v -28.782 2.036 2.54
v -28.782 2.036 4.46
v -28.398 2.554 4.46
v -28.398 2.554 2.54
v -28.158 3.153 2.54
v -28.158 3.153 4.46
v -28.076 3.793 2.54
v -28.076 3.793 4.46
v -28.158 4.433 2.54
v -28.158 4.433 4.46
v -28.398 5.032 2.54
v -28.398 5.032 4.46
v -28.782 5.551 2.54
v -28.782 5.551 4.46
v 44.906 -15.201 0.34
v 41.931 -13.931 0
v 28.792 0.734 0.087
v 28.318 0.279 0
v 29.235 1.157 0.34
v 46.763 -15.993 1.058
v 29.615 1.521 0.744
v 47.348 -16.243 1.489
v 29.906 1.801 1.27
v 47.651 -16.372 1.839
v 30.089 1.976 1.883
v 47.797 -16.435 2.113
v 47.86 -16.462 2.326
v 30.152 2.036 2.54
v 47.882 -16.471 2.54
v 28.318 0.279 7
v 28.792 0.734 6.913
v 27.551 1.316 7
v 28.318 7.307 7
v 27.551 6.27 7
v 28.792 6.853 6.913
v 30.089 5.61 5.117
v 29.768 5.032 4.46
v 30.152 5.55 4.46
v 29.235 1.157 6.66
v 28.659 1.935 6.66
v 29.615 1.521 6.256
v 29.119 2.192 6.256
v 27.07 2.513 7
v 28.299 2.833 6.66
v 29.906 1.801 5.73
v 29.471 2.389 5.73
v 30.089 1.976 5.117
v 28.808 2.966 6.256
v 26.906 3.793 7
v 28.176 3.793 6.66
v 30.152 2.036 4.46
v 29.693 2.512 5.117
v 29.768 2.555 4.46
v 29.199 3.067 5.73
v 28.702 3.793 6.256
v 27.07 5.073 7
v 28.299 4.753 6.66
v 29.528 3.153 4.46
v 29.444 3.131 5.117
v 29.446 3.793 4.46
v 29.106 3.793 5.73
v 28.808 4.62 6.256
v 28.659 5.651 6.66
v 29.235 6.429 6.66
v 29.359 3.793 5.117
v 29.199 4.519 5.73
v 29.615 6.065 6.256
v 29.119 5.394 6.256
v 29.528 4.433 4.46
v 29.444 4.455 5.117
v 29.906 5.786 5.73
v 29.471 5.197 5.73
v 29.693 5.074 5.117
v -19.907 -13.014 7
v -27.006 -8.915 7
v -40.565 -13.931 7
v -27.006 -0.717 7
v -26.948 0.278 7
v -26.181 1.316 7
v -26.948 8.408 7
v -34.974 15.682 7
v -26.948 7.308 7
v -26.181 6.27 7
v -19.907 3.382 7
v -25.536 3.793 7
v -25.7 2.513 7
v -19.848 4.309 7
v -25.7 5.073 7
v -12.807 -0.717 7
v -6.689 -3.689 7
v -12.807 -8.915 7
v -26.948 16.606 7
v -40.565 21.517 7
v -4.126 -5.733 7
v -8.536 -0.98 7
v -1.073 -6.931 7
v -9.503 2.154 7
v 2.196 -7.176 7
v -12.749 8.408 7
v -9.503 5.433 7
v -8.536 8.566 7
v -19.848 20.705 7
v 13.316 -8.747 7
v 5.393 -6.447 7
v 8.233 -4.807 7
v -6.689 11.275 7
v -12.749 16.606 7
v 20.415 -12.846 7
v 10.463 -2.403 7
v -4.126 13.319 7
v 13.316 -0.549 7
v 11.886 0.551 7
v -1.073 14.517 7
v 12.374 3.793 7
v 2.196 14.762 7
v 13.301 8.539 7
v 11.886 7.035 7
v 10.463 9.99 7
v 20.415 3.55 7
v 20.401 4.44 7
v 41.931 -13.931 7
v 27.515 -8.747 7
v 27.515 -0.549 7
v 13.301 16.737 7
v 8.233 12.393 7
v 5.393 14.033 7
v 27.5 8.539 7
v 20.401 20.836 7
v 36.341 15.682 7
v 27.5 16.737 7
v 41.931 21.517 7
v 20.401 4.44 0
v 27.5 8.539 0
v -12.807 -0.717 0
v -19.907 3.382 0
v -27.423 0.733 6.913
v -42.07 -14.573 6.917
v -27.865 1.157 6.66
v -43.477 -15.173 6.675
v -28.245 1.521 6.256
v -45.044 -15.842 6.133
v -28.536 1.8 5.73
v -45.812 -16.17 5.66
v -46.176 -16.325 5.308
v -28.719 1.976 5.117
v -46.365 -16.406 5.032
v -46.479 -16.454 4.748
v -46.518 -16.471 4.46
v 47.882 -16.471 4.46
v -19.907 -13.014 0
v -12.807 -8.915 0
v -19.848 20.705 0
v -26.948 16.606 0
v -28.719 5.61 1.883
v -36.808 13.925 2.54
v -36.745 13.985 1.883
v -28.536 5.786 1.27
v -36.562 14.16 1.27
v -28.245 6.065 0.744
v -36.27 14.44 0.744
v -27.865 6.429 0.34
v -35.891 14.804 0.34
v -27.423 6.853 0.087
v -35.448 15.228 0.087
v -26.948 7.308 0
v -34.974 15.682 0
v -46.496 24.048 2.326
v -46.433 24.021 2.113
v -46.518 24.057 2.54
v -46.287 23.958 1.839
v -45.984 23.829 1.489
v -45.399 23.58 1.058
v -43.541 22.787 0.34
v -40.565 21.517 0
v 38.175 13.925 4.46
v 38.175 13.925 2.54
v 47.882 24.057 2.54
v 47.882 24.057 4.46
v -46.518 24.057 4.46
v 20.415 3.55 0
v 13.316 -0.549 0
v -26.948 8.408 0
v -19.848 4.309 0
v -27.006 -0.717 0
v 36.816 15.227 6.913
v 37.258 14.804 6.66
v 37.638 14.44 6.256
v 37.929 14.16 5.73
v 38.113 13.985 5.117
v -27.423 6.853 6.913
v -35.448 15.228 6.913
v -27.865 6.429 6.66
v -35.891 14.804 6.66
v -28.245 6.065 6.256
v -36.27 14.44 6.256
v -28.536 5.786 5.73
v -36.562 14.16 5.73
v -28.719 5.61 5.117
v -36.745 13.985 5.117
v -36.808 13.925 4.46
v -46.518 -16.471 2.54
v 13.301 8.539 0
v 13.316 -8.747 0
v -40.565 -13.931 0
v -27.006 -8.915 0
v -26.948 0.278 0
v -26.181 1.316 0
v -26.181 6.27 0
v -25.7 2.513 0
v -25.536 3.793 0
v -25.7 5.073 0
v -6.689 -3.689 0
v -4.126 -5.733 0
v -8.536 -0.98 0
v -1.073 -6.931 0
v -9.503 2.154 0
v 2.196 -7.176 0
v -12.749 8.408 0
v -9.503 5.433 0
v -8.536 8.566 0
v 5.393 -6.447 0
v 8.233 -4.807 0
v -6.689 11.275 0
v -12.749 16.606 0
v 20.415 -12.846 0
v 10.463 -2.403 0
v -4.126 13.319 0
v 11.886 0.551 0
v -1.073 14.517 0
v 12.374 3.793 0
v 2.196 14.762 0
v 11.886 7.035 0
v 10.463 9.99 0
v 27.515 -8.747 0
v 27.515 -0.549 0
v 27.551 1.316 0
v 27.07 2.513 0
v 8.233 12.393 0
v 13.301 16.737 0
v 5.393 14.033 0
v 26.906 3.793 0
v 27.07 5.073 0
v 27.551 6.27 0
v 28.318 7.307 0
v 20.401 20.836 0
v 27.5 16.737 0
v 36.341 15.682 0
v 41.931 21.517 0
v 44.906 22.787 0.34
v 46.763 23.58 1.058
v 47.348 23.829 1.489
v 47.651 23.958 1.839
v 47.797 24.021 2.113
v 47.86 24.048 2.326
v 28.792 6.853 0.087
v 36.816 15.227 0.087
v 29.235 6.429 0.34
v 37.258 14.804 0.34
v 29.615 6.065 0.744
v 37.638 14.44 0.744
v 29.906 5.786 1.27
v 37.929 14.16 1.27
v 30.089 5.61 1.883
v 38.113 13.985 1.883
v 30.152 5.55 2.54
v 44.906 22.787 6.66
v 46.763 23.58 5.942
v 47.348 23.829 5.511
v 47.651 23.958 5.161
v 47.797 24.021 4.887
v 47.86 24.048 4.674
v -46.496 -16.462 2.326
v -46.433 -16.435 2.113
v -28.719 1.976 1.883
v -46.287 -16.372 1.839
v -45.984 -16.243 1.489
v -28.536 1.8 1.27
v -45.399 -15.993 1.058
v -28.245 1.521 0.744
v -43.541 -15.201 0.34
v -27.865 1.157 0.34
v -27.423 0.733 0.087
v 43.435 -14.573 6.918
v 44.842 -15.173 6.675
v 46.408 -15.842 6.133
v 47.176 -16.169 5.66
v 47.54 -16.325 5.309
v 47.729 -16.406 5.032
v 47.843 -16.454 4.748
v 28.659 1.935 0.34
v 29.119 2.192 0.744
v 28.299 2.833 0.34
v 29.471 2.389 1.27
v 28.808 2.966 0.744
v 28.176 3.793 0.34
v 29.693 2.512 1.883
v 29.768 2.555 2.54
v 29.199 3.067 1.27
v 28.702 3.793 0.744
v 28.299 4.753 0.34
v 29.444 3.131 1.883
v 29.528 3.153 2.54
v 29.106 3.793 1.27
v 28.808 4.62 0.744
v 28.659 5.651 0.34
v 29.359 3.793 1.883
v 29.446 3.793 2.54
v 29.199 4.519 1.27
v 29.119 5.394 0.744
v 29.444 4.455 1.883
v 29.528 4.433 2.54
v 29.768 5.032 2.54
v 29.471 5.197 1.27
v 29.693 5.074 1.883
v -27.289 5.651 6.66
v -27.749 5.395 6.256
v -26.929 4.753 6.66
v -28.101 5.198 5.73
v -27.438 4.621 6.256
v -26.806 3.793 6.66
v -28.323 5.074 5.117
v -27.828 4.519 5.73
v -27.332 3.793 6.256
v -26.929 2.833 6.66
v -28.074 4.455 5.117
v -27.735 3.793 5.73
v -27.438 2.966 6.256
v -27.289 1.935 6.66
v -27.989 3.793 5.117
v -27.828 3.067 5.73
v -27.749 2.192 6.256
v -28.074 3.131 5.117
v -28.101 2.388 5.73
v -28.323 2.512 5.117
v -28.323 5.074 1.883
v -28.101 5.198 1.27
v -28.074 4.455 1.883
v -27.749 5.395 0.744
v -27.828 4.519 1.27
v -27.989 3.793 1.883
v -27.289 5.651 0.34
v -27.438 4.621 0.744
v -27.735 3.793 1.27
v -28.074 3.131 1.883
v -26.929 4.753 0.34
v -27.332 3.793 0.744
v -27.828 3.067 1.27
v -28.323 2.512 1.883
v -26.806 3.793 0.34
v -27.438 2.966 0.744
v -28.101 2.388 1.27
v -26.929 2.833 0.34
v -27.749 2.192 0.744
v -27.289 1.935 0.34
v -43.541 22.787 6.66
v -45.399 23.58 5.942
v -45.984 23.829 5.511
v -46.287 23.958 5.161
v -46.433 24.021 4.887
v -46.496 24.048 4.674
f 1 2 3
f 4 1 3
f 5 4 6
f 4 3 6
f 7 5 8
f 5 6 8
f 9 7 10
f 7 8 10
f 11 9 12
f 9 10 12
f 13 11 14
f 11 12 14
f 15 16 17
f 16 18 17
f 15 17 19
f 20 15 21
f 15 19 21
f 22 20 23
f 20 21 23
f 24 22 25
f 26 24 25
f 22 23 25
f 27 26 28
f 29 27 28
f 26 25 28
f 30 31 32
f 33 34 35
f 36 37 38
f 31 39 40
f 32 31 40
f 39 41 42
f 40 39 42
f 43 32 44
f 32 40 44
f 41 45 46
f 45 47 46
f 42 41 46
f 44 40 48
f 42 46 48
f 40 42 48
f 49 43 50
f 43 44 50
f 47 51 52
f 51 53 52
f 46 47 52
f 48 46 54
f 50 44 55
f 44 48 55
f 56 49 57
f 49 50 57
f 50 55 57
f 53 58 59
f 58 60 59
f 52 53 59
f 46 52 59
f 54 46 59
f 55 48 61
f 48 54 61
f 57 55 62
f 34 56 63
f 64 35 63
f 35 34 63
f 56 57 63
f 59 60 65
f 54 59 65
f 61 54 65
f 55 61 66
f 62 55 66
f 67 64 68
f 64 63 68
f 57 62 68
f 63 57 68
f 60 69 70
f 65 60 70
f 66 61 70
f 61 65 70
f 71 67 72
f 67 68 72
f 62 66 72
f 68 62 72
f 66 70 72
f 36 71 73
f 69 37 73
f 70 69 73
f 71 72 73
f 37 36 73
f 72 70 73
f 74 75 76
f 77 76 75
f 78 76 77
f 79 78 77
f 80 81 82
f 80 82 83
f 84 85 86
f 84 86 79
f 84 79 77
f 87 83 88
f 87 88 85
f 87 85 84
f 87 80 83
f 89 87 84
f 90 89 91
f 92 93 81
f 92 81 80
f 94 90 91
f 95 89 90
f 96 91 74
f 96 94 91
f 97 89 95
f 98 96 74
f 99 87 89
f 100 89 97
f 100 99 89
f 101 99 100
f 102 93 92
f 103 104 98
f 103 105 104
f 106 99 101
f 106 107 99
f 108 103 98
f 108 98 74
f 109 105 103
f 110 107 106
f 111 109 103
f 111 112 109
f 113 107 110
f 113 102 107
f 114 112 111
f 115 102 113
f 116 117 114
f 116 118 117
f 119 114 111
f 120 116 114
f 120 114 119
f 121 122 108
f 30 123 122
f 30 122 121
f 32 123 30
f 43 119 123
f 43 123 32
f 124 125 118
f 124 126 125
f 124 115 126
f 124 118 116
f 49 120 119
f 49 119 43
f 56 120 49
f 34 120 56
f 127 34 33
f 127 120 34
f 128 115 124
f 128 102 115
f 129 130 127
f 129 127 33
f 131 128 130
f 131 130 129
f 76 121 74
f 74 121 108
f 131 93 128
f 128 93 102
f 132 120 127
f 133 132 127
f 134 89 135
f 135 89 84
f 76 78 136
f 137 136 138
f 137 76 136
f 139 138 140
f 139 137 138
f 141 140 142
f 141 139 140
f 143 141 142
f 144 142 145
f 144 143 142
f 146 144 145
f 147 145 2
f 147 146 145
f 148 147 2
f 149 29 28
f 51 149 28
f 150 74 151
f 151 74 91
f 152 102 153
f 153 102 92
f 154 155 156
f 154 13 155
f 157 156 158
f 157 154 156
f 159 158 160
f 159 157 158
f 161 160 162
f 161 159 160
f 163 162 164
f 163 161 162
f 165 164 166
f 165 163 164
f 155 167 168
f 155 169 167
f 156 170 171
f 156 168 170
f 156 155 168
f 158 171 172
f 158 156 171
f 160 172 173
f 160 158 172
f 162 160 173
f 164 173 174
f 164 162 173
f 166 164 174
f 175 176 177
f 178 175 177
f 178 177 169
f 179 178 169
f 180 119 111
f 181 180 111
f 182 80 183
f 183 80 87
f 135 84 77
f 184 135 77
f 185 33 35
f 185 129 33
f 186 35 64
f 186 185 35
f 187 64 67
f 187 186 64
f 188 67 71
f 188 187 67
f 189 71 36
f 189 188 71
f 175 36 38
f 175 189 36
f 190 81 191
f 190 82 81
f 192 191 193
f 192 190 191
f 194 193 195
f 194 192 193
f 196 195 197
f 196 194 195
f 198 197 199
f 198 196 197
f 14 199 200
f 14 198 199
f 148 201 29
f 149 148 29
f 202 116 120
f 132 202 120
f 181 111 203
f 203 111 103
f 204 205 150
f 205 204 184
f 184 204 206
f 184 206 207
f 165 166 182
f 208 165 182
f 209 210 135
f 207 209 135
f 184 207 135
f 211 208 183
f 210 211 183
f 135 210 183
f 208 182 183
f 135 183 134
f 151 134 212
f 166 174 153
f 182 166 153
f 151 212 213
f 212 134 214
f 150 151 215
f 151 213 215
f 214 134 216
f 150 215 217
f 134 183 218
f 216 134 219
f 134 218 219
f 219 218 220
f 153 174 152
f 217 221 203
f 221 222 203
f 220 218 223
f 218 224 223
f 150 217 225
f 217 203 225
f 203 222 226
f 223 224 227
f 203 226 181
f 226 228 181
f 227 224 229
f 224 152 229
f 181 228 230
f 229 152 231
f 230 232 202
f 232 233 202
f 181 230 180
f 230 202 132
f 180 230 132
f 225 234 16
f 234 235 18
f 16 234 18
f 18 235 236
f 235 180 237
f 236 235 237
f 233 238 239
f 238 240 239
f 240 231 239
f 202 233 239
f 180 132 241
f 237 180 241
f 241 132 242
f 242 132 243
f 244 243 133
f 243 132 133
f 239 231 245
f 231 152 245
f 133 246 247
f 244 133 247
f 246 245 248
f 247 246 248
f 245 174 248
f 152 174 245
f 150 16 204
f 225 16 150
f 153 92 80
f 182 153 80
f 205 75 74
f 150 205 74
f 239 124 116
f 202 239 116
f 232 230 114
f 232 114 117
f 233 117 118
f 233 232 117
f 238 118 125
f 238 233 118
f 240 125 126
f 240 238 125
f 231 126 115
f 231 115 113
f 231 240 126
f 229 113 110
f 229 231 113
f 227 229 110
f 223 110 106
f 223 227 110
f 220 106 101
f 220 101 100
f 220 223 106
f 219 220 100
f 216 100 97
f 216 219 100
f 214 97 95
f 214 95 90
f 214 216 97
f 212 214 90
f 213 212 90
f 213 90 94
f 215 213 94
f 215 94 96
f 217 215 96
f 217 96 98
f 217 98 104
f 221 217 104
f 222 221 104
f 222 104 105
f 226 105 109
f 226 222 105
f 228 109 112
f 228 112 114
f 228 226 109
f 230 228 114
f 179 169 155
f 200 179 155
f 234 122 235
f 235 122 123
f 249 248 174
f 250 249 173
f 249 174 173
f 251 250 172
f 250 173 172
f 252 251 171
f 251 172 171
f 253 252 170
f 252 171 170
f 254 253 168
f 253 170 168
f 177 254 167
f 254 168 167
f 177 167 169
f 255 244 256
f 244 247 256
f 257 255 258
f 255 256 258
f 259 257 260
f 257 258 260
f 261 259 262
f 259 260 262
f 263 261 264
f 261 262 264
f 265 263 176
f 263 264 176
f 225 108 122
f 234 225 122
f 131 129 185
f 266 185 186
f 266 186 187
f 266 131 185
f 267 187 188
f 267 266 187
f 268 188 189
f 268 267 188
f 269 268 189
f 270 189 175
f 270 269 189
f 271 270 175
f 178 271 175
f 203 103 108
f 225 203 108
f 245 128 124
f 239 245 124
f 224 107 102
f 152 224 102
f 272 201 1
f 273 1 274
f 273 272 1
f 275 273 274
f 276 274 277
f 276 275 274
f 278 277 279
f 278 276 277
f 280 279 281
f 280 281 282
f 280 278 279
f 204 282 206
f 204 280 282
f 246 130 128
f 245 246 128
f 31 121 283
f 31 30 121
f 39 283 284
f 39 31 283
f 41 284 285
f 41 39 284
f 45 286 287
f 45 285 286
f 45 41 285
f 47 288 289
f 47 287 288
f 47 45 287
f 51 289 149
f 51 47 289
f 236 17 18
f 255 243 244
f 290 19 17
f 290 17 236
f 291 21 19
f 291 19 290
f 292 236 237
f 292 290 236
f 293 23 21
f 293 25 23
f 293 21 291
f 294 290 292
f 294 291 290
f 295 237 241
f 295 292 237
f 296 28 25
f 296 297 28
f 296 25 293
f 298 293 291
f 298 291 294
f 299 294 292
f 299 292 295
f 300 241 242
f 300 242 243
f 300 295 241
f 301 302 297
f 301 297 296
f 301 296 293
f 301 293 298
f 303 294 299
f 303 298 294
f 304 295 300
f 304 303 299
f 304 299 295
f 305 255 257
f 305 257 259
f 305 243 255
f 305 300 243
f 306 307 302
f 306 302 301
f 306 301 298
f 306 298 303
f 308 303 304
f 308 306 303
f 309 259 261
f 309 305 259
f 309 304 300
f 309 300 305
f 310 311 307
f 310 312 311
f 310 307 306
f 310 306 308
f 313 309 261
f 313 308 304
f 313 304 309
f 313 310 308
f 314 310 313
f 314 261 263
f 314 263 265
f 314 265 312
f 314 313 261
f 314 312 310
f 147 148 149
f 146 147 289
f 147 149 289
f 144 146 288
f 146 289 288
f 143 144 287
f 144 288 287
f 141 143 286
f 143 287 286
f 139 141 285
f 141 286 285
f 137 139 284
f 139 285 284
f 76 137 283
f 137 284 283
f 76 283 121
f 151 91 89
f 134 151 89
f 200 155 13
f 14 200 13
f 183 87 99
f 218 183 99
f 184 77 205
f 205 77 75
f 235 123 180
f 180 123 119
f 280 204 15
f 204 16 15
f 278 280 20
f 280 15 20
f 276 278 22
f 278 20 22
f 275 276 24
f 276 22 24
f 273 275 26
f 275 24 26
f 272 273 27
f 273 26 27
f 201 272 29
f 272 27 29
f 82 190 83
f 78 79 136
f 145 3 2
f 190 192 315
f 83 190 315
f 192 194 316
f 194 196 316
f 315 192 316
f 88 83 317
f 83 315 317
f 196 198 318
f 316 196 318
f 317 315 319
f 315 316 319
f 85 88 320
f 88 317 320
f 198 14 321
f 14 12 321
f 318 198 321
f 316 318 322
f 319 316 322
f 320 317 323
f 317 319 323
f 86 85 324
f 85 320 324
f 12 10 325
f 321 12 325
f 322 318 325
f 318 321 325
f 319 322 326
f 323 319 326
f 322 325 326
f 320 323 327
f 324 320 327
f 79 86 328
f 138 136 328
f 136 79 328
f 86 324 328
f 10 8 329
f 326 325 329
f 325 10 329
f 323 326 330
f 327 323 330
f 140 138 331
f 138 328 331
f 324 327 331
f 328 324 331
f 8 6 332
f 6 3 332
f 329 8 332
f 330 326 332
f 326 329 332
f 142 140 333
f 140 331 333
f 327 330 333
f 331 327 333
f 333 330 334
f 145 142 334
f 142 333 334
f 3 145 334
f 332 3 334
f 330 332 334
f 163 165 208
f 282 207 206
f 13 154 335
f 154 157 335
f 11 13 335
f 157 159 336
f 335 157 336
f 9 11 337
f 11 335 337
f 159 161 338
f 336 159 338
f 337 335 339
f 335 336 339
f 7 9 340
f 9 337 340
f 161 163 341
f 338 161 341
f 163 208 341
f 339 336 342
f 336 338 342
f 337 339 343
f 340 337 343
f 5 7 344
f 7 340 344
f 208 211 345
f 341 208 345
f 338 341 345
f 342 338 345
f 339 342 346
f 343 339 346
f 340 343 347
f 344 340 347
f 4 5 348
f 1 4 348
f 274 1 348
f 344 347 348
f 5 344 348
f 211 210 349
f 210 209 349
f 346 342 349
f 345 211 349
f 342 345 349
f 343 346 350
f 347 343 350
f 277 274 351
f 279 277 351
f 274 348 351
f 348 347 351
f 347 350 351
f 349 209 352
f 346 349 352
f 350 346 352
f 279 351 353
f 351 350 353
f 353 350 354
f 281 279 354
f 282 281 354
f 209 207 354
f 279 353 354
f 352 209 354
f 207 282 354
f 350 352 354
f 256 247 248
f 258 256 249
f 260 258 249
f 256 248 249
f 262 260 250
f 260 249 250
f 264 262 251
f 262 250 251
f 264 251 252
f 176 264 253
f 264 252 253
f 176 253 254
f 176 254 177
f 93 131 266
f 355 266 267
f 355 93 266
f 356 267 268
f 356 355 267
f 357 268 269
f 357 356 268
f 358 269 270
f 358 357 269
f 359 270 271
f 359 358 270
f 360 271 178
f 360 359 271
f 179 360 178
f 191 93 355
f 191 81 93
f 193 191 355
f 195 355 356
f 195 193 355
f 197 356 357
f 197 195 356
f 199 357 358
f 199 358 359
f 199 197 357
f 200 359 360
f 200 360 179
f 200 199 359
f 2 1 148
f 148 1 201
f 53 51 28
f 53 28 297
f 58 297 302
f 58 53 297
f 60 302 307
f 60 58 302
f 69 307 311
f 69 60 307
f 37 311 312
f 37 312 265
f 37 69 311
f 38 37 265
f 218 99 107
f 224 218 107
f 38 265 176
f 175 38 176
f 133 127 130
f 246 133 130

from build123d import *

# Parameters (mm, degrees)
F0_R      = 11
F1_DEPTH  = 7
F2_F1_R   = 2.54
F2_F2_R   = 2.54
F7_DEPTH  = 7.001
F8_DEPTH  = 7.001
F9_DEPTH  = 7.001
F10_DEPTH = 7.001


with BuildPart() as f1:
    # F0 (on Top) → F1 (new body)
    with BuildSketch(Plane.XY):
        Polygon((-46.5175881982, -16.4707175266), (1.3742837651, -16.4707175266), (47.8816837651, -16.4707175266), (38.1750466591, -6.3388262363), (28.4684095532, 3.7930650539), (38.1750466591, 13.9249563442), (47.8816837651, 24.0568476345), (1.3742837651, 24.0568476345), (-46.5175881982, 24.0568476345), (-36.8075984385, 13.9249563442), (-27.0976086789, 3.7930650539), (-36.8075984385, -6.3388262363), align=None)
        with Locations((1.3742837651, 3.7930650539)):
            Circle(F0_R, mode=Mode.SUBTRACT)
    extrude(amount=F1_DEPTH)

    # F2: fillet of radius 2.54 on 10 edges, made by hand

    # F2_f1
    f2_f1_edges = [f1.edges().sort_by_distance(p)[0] for p in [
        (28.4684095532, 3.7930650539, 3.5),
        (-27.0976086789, 3.7930650539, 3.5),
    ]]
    fillet(f2_f1_edges, radius=F2_F1_R)

    # F2_f2
    f2_f2_edges = [f1.edges().sort_by_distance(p)[0] for p in [
        (0.6820477835, -16.4707175266, 7),
        (0.6820477835, 24.0568476345, 7),
        (0.6820477835, 24.0568476345, 0),
        (0.6820477835, -16.4707175266, 0),
        (39.0167452033, -7.2174001498, 7),
        (-37.649739308, 14.8036884491, 7),
        (-37.649739308, -7.2175583413, 0),
        (39.0167452033, 14.8035302576, 0),
        (29.4459362755, 3.7930650539, 0),
        (-28.0757168957, 3.7930650539, 0),
        (-28.0757168957, 3.7930650539, 7),
        (29.4459362755, 3.7930650539, 7),
    ]]
    fillet(f2_f2_edges, radius=F2_F2_R)

    # F3 (on face) → F7 (cut, through all)
    with BuildSketch(Plane.XY.offset(7)):
        Polygon((-12.7487120452, 8.4079941735), (-12.7487120452, 16.6059941735), (-19.8483883054, 20.7049941735), (-26.9480645657, 16.6059941735), (-26.9480645657, 8.4079941735), (-19.8483883054, 4.3089941735), align=None)
    extrude(amount=-F7_DEPTH, mode=Mode.SUBTRACT)

    # F4 (on face) → F8 (cut, through all)
    with BuildSketch(Plane.XY.offset(7)):
        Polygon((-12.8069793108, -8.9152967557), (-12.8069793108, -0.7172967557), (-19.906655571, 3.3817032443), (-27.0063318312, -0.7172967557), (-27.0063318312, -8.9152967557), (-19.906655571, -13.0142967557), align=None)
    extrude(amount=-F8_DEPTH, mode=Mode.SUBTRACT)

    # F6 (on face) → F9 (cut, through all)
    with BuildSketch(Plane.XY.offset(7)):
        Polygon((27.5151642737, -8.7466302544), (27.5151642737, -0.5486302544), (20.4154880135, 3.5503697456), (13.3158117533, -0.5486302544), (13.3158117533, -8.7466302544), (20.4154880135, -12.8456302544), align=None)
    extrude(amount=-F9_DEPTH, mode=Mode.SUBTRACT)

    # F5 (on face) → F10 (cut, through all)
    with BuildSketch(Plane.XY.offset(7)):
        Polygon((27.5004574447, 8.5391272614), (27.5004574447, 16.7371272614), (20.4007811844, 20.8361272614), (13.3011049242, 16.7371272614), (13.3011049242, 8.5391272614), (20.4007811844, 4.4401272614), align=None)
    extrude(amount=-F10_DEPTH, mode=Mode.SUBTRACT)


solid = f1.part
